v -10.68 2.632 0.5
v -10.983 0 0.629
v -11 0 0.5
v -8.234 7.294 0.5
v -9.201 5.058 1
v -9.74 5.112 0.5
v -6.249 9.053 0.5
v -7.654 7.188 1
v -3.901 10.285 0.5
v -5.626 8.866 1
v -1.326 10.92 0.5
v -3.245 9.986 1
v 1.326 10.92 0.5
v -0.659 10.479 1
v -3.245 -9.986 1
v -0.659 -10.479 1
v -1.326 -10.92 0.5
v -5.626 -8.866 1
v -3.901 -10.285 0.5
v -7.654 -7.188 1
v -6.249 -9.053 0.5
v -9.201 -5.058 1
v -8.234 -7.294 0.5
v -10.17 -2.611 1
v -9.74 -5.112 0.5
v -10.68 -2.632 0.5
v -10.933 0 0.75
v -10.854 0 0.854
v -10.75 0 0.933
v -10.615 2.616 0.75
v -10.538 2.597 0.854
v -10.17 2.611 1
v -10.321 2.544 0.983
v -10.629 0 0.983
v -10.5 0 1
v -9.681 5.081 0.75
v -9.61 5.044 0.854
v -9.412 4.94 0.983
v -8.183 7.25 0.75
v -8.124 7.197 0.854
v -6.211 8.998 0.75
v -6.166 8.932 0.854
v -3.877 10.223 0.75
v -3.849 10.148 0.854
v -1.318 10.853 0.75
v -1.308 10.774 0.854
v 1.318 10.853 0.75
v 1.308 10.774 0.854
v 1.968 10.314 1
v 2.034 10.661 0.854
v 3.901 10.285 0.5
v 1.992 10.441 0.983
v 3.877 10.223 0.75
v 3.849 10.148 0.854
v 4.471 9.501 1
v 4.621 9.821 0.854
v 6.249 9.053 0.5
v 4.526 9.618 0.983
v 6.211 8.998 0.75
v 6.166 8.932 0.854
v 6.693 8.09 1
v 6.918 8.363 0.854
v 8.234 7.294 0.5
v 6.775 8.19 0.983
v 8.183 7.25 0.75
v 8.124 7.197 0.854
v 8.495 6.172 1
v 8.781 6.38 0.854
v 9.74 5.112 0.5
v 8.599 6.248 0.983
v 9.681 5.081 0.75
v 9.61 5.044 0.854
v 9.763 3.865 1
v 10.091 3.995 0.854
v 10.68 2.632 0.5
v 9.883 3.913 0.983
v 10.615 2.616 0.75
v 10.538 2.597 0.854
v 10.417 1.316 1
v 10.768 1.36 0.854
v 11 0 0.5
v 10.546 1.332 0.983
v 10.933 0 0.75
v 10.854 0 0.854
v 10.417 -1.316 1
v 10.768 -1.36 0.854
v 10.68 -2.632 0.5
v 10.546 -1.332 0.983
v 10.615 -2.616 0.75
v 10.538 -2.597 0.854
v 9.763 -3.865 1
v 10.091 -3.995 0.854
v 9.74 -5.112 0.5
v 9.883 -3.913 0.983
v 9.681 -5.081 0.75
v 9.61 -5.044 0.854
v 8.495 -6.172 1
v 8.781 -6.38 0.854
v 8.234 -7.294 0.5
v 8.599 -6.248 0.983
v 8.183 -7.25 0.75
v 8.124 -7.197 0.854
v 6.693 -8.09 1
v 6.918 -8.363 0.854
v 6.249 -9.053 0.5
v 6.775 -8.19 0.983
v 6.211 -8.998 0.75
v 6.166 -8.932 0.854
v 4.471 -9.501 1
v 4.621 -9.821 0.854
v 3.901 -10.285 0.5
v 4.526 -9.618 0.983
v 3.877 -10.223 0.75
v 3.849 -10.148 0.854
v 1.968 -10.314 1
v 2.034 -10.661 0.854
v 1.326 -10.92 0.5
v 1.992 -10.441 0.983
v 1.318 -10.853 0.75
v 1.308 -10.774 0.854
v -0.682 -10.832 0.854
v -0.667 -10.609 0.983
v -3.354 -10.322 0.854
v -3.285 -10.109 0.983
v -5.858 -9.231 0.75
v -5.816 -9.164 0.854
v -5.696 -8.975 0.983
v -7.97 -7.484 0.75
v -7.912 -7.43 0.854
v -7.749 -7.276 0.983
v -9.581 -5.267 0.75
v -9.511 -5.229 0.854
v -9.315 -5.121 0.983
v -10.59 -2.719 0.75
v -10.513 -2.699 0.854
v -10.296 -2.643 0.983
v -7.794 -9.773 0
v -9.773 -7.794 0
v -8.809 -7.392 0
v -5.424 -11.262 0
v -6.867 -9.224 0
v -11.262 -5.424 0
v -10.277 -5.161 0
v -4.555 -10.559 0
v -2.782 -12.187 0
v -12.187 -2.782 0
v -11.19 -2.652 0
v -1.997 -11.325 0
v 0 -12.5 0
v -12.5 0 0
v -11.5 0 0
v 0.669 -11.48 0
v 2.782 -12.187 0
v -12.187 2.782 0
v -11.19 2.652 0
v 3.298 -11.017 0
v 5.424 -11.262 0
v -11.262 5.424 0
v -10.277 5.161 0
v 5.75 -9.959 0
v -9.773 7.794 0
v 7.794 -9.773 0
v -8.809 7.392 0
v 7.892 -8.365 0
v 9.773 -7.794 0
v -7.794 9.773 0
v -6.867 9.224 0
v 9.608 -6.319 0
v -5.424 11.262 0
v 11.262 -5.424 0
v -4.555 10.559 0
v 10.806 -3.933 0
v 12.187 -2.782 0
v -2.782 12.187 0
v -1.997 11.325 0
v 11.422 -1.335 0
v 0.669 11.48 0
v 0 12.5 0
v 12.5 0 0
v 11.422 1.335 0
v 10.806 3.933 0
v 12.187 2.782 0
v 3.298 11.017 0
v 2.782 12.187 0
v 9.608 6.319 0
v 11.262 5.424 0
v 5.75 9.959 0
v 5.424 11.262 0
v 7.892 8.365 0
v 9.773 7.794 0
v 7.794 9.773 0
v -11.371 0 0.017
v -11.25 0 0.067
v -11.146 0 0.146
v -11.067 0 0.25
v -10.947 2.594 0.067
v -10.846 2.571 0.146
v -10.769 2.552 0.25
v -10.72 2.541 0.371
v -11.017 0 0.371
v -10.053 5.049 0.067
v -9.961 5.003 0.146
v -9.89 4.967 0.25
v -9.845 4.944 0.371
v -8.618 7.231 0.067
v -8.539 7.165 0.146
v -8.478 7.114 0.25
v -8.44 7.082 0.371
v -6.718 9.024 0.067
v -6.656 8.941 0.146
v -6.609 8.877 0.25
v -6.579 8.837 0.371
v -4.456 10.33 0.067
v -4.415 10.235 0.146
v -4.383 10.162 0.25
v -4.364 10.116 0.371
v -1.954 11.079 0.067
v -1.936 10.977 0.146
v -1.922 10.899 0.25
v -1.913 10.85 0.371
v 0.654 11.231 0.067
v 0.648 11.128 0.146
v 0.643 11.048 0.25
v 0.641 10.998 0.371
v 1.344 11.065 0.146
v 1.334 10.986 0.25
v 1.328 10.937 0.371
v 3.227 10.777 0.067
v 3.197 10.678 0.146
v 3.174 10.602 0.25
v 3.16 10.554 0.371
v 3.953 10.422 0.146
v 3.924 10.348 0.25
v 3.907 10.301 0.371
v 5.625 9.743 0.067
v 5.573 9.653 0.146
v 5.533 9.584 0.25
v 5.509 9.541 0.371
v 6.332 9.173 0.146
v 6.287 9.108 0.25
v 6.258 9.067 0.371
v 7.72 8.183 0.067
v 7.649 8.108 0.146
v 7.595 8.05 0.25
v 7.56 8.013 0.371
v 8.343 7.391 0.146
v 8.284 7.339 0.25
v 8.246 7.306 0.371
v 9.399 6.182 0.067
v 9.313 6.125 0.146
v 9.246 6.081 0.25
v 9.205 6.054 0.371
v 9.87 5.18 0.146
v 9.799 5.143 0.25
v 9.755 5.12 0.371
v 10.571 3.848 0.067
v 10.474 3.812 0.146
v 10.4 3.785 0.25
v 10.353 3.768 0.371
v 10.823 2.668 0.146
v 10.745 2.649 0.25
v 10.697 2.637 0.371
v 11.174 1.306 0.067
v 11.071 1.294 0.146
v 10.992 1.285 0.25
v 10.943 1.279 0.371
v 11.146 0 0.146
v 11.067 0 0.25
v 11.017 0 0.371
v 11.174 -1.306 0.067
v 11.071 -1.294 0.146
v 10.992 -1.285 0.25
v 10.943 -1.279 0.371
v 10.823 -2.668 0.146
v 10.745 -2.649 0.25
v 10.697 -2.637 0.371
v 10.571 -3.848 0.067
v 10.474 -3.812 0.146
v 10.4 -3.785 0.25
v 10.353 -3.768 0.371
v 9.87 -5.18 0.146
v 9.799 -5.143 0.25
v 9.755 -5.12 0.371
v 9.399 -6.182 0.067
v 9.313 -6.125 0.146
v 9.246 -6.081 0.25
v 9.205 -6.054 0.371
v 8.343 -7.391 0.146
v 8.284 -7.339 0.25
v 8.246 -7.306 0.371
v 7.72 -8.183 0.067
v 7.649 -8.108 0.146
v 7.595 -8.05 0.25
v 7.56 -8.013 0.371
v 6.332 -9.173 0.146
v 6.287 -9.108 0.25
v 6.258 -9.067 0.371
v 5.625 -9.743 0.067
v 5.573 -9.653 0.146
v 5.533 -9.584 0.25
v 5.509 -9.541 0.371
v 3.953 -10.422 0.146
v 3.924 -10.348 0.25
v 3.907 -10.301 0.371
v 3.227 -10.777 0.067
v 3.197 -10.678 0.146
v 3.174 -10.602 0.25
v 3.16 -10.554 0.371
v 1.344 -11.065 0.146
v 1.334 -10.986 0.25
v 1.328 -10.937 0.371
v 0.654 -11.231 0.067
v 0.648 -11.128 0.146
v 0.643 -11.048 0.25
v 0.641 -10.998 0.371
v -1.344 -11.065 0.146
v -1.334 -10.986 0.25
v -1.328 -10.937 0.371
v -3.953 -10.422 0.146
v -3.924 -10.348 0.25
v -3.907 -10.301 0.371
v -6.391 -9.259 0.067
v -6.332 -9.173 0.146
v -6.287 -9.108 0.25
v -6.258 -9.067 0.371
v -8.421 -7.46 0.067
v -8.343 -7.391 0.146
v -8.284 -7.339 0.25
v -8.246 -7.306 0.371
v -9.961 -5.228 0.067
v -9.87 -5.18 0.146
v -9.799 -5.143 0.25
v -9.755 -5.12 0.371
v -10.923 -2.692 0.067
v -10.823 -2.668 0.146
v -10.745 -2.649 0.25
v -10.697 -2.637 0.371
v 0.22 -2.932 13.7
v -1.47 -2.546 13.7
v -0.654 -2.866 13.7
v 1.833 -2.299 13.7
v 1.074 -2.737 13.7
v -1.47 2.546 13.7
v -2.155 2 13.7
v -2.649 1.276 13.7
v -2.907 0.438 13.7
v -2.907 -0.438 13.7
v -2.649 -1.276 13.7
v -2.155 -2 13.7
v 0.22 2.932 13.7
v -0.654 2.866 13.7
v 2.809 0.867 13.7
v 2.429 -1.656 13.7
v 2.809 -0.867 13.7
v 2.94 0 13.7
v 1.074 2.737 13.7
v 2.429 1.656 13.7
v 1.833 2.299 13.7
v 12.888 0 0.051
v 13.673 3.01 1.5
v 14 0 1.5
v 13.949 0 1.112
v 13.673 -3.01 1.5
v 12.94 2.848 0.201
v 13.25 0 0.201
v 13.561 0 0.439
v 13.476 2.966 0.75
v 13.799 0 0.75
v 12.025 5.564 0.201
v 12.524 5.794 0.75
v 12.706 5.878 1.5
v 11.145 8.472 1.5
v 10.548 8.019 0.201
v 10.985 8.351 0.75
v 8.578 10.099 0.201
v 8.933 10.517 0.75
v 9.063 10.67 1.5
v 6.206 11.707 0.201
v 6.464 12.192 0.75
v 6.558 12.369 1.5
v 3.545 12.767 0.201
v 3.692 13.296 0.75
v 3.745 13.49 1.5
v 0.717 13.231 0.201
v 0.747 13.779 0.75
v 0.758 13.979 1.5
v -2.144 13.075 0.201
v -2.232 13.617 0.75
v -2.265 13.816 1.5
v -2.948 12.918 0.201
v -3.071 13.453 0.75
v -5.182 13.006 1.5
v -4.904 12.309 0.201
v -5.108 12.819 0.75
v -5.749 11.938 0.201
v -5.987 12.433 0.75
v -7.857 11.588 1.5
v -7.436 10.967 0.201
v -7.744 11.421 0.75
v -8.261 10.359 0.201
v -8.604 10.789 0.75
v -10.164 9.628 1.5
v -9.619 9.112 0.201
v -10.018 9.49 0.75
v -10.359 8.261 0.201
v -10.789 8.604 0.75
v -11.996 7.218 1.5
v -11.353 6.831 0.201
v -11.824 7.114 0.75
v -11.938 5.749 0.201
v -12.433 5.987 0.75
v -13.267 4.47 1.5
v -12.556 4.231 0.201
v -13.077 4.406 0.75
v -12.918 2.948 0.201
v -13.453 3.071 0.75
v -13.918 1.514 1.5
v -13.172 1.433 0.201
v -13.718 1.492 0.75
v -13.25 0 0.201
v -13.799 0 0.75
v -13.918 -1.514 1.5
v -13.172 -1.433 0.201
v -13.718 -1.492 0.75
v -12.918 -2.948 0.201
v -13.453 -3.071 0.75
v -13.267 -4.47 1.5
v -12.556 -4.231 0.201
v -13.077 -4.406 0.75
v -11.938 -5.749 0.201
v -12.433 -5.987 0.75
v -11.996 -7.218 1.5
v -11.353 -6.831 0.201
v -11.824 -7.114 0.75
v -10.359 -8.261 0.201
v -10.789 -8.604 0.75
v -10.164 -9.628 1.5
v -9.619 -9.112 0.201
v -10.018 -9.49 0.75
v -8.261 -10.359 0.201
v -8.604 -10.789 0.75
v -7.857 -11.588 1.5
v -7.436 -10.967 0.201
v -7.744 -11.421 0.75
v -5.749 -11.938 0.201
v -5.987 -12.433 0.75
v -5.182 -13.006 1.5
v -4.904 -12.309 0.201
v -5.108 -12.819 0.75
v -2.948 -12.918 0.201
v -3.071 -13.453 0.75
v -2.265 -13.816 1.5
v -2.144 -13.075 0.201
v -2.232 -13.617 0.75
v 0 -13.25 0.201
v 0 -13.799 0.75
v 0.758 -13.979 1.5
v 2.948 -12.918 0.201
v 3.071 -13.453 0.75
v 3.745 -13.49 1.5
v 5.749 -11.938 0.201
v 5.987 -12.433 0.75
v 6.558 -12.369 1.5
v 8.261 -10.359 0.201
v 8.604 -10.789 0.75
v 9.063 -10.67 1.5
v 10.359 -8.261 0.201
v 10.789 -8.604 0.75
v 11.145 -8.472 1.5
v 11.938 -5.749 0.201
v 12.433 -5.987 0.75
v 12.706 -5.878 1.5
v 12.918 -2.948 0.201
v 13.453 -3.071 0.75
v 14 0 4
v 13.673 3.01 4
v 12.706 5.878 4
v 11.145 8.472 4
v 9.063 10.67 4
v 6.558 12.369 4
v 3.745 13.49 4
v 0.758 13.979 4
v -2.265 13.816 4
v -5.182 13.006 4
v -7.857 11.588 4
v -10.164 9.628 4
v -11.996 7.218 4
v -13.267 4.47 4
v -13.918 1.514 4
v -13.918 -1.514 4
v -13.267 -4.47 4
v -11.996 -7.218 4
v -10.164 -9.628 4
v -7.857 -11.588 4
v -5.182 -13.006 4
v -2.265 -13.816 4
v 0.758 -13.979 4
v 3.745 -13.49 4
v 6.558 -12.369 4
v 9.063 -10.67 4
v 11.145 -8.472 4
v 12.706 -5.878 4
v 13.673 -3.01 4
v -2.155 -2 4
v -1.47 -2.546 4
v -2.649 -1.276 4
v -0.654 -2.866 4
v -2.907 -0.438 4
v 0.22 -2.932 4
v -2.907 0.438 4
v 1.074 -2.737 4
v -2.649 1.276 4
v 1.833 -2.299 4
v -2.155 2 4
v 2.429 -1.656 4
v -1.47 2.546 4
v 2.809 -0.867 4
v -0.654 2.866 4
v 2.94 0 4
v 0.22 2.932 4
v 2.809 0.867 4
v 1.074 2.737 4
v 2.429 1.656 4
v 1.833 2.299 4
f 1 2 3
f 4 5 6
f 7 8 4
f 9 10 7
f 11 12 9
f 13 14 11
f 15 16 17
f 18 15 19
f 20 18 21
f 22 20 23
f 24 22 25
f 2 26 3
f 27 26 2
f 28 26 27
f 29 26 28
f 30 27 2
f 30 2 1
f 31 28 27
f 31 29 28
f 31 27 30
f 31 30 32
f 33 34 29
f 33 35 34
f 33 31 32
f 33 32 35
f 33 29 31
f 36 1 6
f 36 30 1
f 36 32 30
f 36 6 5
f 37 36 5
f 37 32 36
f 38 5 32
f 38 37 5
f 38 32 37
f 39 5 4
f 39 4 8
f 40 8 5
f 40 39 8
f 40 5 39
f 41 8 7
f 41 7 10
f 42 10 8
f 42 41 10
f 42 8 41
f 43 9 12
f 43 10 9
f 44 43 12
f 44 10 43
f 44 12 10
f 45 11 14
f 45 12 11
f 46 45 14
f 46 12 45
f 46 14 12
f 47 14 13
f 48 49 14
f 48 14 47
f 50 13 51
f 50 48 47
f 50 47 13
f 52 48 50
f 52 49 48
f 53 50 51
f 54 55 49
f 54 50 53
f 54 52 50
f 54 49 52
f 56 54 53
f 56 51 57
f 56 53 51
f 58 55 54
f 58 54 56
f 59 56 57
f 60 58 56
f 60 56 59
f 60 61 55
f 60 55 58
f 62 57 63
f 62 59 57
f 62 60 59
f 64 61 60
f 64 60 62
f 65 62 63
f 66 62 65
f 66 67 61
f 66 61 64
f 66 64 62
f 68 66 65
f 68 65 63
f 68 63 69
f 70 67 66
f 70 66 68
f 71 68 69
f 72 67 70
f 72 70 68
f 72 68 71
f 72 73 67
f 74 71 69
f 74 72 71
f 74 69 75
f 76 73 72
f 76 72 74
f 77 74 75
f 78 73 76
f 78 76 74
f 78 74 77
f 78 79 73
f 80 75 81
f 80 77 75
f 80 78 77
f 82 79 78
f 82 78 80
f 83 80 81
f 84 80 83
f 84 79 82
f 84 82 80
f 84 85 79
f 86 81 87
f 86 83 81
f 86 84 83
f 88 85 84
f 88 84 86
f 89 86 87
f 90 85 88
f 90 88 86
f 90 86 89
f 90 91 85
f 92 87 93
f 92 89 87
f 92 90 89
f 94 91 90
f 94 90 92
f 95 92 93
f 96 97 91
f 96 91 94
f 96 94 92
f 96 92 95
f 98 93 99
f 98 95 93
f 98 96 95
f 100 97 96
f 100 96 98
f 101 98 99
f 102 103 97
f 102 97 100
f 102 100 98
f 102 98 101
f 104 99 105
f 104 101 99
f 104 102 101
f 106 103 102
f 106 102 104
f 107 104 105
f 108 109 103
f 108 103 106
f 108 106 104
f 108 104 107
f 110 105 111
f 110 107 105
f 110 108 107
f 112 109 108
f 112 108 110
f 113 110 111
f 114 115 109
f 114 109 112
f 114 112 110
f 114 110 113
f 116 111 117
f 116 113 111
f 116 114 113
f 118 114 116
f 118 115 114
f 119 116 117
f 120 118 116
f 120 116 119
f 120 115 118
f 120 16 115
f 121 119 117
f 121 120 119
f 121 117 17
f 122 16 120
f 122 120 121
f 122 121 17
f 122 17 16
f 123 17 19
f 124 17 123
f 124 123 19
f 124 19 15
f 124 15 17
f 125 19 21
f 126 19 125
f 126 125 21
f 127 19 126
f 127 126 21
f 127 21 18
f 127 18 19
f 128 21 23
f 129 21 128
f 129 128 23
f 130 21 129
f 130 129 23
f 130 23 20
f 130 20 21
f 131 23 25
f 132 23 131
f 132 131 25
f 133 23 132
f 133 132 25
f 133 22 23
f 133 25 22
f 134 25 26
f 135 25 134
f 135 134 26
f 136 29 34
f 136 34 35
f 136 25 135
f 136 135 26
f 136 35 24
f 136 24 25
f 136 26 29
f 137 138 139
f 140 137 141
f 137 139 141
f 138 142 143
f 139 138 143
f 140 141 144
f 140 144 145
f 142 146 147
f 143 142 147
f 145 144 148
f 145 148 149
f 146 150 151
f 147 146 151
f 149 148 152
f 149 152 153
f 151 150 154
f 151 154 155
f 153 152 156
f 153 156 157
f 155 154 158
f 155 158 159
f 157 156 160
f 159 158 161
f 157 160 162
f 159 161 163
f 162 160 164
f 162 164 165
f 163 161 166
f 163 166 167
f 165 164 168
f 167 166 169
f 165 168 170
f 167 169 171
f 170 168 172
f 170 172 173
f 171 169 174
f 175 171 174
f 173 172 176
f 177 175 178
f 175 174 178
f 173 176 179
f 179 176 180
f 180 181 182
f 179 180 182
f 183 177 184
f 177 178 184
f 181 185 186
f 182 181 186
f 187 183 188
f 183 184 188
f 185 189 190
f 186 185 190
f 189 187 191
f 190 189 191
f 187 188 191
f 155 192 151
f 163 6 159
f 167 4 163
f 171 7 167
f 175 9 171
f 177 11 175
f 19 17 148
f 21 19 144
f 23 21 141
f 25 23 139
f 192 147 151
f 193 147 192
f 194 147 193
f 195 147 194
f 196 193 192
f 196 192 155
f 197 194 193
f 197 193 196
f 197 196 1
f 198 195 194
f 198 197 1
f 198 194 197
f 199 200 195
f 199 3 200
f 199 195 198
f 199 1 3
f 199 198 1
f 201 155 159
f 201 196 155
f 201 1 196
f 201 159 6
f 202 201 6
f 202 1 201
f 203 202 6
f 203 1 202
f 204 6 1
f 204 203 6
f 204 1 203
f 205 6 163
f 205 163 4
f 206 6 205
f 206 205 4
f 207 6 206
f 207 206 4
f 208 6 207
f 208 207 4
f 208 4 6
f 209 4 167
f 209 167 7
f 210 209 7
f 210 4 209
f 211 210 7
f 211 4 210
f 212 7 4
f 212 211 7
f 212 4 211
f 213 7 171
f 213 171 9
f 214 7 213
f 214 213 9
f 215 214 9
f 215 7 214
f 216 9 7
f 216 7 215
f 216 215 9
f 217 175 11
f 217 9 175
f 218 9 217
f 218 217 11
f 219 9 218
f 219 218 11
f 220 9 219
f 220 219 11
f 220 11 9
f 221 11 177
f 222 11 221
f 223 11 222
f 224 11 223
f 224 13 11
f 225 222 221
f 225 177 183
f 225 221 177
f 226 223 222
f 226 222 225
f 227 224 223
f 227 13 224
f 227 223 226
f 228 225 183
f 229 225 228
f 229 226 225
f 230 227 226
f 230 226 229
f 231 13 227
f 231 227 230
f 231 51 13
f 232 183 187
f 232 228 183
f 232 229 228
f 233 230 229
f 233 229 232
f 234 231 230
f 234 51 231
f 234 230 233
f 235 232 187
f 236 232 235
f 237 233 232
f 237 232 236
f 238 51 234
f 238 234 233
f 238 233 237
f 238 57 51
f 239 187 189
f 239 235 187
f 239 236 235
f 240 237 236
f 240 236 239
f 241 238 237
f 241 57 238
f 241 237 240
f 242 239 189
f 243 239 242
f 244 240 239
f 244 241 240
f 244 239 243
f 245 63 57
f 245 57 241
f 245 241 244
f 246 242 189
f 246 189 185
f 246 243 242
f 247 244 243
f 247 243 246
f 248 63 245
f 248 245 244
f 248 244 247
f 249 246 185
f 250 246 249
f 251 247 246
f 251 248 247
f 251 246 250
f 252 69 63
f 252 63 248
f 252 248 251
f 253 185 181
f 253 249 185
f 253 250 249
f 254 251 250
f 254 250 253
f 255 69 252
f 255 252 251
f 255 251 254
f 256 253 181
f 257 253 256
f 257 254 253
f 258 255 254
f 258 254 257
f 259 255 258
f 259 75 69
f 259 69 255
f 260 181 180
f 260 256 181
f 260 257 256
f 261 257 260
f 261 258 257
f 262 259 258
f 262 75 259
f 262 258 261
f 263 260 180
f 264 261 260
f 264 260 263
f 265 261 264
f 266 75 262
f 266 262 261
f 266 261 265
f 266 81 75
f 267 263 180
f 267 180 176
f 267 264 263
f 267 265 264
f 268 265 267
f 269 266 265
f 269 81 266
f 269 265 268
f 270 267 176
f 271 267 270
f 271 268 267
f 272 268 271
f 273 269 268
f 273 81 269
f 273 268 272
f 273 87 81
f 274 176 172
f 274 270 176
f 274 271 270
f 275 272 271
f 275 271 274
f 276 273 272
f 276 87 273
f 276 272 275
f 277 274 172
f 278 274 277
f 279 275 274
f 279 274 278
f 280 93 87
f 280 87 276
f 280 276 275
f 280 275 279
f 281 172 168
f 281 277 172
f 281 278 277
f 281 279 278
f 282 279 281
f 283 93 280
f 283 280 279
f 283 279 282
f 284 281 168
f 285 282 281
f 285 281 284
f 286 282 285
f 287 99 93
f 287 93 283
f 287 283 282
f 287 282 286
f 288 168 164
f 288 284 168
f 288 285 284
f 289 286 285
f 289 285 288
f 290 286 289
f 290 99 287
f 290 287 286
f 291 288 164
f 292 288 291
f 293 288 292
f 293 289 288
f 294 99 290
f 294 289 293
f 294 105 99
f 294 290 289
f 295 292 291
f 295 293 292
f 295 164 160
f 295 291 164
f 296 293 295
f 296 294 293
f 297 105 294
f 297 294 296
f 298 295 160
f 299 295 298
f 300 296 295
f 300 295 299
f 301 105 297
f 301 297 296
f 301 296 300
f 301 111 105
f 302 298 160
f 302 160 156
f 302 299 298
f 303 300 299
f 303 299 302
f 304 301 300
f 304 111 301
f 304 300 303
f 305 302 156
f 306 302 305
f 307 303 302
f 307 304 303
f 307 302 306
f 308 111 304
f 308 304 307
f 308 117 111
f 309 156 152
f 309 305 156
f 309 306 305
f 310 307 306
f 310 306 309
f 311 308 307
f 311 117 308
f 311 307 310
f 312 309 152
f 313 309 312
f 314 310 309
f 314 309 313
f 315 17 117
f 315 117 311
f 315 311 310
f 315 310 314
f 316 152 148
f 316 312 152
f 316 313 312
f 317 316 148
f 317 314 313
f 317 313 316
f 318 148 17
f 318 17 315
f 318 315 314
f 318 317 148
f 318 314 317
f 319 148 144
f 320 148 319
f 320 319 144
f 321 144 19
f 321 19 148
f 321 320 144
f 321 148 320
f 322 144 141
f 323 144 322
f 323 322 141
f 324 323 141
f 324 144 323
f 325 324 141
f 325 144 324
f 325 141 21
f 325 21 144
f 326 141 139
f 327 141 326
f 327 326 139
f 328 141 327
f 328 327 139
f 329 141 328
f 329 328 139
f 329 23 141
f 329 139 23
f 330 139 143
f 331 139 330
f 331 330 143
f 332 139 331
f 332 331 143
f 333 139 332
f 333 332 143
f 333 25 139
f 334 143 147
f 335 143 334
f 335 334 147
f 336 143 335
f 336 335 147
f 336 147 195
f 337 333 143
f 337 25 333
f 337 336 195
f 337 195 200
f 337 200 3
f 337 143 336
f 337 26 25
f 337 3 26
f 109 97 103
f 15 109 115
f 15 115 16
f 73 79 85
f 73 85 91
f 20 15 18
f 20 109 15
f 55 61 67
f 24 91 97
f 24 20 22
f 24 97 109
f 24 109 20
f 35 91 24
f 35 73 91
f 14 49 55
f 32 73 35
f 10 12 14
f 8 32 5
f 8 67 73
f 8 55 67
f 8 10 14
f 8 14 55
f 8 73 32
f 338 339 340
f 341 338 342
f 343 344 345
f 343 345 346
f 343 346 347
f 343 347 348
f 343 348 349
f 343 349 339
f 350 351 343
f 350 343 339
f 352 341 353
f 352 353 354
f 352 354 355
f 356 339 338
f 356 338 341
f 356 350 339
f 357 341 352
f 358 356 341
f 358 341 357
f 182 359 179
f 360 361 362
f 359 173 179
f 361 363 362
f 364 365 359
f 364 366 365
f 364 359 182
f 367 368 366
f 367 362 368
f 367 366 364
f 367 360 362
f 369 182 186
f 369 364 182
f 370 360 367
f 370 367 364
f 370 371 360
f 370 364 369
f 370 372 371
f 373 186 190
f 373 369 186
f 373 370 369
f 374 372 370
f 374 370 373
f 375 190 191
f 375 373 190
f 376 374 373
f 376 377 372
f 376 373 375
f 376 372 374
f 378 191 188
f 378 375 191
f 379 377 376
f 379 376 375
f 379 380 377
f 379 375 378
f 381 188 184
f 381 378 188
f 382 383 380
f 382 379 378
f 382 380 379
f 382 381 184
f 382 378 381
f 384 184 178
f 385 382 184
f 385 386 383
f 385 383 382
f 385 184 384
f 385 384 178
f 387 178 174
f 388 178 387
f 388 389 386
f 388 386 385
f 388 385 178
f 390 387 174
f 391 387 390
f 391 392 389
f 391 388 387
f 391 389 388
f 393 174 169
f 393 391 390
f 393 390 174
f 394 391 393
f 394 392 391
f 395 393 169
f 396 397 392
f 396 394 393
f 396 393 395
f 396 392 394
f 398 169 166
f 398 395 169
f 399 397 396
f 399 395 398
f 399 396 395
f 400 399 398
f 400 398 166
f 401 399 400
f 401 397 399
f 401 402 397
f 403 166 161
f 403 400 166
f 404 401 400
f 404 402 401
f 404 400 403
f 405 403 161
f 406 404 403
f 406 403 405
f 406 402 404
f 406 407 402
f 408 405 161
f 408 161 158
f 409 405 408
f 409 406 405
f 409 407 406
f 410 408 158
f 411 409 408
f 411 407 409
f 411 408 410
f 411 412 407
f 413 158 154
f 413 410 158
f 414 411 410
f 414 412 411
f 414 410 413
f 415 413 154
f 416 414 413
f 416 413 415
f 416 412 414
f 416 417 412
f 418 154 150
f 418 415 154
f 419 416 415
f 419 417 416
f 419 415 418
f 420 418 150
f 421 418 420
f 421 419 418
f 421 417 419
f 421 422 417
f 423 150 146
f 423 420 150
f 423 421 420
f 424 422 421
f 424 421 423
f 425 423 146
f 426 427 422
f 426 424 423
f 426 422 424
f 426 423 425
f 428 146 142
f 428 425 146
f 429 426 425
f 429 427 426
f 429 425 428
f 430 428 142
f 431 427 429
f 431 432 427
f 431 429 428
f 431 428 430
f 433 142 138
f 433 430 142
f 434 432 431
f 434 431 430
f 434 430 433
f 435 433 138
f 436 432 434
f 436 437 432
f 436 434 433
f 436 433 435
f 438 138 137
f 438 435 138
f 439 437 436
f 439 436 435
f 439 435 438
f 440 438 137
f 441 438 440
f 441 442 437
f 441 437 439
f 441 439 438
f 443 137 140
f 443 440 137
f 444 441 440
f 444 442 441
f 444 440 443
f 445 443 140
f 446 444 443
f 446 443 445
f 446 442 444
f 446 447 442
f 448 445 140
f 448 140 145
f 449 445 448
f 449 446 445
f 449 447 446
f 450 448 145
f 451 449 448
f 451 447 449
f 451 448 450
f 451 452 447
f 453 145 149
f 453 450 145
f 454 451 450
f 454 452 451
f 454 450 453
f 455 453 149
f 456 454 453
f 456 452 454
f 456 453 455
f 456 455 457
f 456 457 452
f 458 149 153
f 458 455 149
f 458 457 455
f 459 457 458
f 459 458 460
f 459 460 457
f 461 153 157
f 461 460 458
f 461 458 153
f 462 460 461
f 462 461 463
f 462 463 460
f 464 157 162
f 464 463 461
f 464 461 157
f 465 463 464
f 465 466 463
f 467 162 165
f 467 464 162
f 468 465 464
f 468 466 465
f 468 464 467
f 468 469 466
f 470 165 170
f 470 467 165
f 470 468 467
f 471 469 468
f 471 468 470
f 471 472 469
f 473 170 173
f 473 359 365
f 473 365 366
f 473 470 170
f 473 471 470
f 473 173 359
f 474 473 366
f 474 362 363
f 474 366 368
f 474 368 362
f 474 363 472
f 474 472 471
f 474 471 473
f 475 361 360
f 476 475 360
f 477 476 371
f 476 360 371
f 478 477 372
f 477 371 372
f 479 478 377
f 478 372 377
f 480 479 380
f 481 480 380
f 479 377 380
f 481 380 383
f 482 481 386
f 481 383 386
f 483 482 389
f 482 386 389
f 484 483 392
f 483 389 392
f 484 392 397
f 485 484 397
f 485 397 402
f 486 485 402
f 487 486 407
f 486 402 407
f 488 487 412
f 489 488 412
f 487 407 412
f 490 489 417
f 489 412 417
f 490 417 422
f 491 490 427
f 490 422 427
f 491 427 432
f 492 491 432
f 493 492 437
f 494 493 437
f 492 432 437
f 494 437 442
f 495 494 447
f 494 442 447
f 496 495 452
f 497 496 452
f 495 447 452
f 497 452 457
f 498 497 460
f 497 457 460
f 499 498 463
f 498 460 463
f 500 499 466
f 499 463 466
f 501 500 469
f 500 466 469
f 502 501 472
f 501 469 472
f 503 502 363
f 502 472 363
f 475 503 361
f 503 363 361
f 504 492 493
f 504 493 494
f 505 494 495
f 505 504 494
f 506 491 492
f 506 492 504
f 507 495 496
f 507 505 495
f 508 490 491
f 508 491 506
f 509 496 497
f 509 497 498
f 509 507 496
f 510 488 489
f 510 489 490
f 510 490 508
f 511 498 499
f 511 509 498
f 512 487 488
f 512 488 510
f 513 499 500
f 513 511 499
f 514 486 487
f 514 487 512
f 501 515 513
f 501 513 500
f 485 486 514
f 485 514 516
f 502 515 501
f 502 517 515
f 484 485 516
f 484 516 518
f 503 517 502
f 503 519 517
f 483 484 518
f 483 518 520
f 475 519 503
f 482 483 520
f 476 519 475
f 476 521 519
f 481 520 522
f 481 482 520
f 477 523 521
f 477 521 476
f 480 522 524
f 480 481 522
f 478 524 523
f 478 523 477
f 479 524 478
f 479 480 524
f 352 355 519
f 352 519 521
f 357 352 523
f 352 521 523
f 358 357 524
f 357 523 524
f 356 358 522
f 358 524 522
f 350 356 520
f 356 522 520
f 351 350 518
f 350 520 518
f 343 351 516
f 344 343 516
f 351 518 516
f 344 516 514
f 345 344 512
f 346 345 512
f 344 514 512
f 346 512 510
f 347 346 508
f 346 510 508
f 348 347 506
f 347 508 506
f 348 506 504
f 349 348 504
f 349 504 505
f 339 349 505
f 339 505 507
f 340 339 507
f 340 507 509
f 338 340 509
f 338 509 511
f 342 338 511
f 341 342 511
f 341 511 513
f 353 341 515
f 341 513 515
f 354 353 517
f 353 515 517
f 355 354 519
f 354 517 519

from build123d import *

# Parameters (mm, degrees)
SKETCH1_R           = 14
BOSS_EXTRUDE1_DEPTH = 4
SKETCH2_R           = 2.94
BOSS_EXTRUDE2_DEPTH = 9.7
SKETCH4_R           = 11
CUT_EXTRUDE1_DEPTH  = 1
FILLET1_R           = 0.5
FILLET2_R           = 1.5


with BuildPart() as part:
    # Sketch1 → Boss-Extrude1 (new body)
    with BuildSketch(Plane.XY):
        Circle(SKETCH1_R)
    extrude(amount=BOSS_EXTRUDE1_DEPTH)

    # Sketch2 → Boss-Extrude2 (add)
    with BuildSketch(Plane.XY.offset(4)):
        Circle(SKETCH2_R)
    extrude(amount=BOSS_EXTRUDE2_DEPTH)

    # Sketch4 → Cut-Extrude1 (cut)
    with BuildSketch(Plane(origin=(0, 0, 0), x_dir=(-1, 0, 0), z_dir=(0, 0, -1))):
        Circle(SKETCH4_R)
    extrude(amount=-CUT_EXTRUDE1_DEPTH, mode=Mode.SUBTRACT)

    # Fillet1
    fillet1_edges = [part.edges().sort_by_distance(p)[0] for p in [
        (11, 0, 1),
        (11, 0, 0),
    ]]
    fillet(fillet1_edges, radius=FILLET1_R - 0.0001)  # a hair under: the kernel refuses the full size

    # Fillet2
    fillet2_edges = [part.edges().sort_by_distance(p)[0] for p in [
        (-14, 0, 0),
    ]]
    fillet(fillet2_edges, radius=FILLET2_R)


solid = part.part
